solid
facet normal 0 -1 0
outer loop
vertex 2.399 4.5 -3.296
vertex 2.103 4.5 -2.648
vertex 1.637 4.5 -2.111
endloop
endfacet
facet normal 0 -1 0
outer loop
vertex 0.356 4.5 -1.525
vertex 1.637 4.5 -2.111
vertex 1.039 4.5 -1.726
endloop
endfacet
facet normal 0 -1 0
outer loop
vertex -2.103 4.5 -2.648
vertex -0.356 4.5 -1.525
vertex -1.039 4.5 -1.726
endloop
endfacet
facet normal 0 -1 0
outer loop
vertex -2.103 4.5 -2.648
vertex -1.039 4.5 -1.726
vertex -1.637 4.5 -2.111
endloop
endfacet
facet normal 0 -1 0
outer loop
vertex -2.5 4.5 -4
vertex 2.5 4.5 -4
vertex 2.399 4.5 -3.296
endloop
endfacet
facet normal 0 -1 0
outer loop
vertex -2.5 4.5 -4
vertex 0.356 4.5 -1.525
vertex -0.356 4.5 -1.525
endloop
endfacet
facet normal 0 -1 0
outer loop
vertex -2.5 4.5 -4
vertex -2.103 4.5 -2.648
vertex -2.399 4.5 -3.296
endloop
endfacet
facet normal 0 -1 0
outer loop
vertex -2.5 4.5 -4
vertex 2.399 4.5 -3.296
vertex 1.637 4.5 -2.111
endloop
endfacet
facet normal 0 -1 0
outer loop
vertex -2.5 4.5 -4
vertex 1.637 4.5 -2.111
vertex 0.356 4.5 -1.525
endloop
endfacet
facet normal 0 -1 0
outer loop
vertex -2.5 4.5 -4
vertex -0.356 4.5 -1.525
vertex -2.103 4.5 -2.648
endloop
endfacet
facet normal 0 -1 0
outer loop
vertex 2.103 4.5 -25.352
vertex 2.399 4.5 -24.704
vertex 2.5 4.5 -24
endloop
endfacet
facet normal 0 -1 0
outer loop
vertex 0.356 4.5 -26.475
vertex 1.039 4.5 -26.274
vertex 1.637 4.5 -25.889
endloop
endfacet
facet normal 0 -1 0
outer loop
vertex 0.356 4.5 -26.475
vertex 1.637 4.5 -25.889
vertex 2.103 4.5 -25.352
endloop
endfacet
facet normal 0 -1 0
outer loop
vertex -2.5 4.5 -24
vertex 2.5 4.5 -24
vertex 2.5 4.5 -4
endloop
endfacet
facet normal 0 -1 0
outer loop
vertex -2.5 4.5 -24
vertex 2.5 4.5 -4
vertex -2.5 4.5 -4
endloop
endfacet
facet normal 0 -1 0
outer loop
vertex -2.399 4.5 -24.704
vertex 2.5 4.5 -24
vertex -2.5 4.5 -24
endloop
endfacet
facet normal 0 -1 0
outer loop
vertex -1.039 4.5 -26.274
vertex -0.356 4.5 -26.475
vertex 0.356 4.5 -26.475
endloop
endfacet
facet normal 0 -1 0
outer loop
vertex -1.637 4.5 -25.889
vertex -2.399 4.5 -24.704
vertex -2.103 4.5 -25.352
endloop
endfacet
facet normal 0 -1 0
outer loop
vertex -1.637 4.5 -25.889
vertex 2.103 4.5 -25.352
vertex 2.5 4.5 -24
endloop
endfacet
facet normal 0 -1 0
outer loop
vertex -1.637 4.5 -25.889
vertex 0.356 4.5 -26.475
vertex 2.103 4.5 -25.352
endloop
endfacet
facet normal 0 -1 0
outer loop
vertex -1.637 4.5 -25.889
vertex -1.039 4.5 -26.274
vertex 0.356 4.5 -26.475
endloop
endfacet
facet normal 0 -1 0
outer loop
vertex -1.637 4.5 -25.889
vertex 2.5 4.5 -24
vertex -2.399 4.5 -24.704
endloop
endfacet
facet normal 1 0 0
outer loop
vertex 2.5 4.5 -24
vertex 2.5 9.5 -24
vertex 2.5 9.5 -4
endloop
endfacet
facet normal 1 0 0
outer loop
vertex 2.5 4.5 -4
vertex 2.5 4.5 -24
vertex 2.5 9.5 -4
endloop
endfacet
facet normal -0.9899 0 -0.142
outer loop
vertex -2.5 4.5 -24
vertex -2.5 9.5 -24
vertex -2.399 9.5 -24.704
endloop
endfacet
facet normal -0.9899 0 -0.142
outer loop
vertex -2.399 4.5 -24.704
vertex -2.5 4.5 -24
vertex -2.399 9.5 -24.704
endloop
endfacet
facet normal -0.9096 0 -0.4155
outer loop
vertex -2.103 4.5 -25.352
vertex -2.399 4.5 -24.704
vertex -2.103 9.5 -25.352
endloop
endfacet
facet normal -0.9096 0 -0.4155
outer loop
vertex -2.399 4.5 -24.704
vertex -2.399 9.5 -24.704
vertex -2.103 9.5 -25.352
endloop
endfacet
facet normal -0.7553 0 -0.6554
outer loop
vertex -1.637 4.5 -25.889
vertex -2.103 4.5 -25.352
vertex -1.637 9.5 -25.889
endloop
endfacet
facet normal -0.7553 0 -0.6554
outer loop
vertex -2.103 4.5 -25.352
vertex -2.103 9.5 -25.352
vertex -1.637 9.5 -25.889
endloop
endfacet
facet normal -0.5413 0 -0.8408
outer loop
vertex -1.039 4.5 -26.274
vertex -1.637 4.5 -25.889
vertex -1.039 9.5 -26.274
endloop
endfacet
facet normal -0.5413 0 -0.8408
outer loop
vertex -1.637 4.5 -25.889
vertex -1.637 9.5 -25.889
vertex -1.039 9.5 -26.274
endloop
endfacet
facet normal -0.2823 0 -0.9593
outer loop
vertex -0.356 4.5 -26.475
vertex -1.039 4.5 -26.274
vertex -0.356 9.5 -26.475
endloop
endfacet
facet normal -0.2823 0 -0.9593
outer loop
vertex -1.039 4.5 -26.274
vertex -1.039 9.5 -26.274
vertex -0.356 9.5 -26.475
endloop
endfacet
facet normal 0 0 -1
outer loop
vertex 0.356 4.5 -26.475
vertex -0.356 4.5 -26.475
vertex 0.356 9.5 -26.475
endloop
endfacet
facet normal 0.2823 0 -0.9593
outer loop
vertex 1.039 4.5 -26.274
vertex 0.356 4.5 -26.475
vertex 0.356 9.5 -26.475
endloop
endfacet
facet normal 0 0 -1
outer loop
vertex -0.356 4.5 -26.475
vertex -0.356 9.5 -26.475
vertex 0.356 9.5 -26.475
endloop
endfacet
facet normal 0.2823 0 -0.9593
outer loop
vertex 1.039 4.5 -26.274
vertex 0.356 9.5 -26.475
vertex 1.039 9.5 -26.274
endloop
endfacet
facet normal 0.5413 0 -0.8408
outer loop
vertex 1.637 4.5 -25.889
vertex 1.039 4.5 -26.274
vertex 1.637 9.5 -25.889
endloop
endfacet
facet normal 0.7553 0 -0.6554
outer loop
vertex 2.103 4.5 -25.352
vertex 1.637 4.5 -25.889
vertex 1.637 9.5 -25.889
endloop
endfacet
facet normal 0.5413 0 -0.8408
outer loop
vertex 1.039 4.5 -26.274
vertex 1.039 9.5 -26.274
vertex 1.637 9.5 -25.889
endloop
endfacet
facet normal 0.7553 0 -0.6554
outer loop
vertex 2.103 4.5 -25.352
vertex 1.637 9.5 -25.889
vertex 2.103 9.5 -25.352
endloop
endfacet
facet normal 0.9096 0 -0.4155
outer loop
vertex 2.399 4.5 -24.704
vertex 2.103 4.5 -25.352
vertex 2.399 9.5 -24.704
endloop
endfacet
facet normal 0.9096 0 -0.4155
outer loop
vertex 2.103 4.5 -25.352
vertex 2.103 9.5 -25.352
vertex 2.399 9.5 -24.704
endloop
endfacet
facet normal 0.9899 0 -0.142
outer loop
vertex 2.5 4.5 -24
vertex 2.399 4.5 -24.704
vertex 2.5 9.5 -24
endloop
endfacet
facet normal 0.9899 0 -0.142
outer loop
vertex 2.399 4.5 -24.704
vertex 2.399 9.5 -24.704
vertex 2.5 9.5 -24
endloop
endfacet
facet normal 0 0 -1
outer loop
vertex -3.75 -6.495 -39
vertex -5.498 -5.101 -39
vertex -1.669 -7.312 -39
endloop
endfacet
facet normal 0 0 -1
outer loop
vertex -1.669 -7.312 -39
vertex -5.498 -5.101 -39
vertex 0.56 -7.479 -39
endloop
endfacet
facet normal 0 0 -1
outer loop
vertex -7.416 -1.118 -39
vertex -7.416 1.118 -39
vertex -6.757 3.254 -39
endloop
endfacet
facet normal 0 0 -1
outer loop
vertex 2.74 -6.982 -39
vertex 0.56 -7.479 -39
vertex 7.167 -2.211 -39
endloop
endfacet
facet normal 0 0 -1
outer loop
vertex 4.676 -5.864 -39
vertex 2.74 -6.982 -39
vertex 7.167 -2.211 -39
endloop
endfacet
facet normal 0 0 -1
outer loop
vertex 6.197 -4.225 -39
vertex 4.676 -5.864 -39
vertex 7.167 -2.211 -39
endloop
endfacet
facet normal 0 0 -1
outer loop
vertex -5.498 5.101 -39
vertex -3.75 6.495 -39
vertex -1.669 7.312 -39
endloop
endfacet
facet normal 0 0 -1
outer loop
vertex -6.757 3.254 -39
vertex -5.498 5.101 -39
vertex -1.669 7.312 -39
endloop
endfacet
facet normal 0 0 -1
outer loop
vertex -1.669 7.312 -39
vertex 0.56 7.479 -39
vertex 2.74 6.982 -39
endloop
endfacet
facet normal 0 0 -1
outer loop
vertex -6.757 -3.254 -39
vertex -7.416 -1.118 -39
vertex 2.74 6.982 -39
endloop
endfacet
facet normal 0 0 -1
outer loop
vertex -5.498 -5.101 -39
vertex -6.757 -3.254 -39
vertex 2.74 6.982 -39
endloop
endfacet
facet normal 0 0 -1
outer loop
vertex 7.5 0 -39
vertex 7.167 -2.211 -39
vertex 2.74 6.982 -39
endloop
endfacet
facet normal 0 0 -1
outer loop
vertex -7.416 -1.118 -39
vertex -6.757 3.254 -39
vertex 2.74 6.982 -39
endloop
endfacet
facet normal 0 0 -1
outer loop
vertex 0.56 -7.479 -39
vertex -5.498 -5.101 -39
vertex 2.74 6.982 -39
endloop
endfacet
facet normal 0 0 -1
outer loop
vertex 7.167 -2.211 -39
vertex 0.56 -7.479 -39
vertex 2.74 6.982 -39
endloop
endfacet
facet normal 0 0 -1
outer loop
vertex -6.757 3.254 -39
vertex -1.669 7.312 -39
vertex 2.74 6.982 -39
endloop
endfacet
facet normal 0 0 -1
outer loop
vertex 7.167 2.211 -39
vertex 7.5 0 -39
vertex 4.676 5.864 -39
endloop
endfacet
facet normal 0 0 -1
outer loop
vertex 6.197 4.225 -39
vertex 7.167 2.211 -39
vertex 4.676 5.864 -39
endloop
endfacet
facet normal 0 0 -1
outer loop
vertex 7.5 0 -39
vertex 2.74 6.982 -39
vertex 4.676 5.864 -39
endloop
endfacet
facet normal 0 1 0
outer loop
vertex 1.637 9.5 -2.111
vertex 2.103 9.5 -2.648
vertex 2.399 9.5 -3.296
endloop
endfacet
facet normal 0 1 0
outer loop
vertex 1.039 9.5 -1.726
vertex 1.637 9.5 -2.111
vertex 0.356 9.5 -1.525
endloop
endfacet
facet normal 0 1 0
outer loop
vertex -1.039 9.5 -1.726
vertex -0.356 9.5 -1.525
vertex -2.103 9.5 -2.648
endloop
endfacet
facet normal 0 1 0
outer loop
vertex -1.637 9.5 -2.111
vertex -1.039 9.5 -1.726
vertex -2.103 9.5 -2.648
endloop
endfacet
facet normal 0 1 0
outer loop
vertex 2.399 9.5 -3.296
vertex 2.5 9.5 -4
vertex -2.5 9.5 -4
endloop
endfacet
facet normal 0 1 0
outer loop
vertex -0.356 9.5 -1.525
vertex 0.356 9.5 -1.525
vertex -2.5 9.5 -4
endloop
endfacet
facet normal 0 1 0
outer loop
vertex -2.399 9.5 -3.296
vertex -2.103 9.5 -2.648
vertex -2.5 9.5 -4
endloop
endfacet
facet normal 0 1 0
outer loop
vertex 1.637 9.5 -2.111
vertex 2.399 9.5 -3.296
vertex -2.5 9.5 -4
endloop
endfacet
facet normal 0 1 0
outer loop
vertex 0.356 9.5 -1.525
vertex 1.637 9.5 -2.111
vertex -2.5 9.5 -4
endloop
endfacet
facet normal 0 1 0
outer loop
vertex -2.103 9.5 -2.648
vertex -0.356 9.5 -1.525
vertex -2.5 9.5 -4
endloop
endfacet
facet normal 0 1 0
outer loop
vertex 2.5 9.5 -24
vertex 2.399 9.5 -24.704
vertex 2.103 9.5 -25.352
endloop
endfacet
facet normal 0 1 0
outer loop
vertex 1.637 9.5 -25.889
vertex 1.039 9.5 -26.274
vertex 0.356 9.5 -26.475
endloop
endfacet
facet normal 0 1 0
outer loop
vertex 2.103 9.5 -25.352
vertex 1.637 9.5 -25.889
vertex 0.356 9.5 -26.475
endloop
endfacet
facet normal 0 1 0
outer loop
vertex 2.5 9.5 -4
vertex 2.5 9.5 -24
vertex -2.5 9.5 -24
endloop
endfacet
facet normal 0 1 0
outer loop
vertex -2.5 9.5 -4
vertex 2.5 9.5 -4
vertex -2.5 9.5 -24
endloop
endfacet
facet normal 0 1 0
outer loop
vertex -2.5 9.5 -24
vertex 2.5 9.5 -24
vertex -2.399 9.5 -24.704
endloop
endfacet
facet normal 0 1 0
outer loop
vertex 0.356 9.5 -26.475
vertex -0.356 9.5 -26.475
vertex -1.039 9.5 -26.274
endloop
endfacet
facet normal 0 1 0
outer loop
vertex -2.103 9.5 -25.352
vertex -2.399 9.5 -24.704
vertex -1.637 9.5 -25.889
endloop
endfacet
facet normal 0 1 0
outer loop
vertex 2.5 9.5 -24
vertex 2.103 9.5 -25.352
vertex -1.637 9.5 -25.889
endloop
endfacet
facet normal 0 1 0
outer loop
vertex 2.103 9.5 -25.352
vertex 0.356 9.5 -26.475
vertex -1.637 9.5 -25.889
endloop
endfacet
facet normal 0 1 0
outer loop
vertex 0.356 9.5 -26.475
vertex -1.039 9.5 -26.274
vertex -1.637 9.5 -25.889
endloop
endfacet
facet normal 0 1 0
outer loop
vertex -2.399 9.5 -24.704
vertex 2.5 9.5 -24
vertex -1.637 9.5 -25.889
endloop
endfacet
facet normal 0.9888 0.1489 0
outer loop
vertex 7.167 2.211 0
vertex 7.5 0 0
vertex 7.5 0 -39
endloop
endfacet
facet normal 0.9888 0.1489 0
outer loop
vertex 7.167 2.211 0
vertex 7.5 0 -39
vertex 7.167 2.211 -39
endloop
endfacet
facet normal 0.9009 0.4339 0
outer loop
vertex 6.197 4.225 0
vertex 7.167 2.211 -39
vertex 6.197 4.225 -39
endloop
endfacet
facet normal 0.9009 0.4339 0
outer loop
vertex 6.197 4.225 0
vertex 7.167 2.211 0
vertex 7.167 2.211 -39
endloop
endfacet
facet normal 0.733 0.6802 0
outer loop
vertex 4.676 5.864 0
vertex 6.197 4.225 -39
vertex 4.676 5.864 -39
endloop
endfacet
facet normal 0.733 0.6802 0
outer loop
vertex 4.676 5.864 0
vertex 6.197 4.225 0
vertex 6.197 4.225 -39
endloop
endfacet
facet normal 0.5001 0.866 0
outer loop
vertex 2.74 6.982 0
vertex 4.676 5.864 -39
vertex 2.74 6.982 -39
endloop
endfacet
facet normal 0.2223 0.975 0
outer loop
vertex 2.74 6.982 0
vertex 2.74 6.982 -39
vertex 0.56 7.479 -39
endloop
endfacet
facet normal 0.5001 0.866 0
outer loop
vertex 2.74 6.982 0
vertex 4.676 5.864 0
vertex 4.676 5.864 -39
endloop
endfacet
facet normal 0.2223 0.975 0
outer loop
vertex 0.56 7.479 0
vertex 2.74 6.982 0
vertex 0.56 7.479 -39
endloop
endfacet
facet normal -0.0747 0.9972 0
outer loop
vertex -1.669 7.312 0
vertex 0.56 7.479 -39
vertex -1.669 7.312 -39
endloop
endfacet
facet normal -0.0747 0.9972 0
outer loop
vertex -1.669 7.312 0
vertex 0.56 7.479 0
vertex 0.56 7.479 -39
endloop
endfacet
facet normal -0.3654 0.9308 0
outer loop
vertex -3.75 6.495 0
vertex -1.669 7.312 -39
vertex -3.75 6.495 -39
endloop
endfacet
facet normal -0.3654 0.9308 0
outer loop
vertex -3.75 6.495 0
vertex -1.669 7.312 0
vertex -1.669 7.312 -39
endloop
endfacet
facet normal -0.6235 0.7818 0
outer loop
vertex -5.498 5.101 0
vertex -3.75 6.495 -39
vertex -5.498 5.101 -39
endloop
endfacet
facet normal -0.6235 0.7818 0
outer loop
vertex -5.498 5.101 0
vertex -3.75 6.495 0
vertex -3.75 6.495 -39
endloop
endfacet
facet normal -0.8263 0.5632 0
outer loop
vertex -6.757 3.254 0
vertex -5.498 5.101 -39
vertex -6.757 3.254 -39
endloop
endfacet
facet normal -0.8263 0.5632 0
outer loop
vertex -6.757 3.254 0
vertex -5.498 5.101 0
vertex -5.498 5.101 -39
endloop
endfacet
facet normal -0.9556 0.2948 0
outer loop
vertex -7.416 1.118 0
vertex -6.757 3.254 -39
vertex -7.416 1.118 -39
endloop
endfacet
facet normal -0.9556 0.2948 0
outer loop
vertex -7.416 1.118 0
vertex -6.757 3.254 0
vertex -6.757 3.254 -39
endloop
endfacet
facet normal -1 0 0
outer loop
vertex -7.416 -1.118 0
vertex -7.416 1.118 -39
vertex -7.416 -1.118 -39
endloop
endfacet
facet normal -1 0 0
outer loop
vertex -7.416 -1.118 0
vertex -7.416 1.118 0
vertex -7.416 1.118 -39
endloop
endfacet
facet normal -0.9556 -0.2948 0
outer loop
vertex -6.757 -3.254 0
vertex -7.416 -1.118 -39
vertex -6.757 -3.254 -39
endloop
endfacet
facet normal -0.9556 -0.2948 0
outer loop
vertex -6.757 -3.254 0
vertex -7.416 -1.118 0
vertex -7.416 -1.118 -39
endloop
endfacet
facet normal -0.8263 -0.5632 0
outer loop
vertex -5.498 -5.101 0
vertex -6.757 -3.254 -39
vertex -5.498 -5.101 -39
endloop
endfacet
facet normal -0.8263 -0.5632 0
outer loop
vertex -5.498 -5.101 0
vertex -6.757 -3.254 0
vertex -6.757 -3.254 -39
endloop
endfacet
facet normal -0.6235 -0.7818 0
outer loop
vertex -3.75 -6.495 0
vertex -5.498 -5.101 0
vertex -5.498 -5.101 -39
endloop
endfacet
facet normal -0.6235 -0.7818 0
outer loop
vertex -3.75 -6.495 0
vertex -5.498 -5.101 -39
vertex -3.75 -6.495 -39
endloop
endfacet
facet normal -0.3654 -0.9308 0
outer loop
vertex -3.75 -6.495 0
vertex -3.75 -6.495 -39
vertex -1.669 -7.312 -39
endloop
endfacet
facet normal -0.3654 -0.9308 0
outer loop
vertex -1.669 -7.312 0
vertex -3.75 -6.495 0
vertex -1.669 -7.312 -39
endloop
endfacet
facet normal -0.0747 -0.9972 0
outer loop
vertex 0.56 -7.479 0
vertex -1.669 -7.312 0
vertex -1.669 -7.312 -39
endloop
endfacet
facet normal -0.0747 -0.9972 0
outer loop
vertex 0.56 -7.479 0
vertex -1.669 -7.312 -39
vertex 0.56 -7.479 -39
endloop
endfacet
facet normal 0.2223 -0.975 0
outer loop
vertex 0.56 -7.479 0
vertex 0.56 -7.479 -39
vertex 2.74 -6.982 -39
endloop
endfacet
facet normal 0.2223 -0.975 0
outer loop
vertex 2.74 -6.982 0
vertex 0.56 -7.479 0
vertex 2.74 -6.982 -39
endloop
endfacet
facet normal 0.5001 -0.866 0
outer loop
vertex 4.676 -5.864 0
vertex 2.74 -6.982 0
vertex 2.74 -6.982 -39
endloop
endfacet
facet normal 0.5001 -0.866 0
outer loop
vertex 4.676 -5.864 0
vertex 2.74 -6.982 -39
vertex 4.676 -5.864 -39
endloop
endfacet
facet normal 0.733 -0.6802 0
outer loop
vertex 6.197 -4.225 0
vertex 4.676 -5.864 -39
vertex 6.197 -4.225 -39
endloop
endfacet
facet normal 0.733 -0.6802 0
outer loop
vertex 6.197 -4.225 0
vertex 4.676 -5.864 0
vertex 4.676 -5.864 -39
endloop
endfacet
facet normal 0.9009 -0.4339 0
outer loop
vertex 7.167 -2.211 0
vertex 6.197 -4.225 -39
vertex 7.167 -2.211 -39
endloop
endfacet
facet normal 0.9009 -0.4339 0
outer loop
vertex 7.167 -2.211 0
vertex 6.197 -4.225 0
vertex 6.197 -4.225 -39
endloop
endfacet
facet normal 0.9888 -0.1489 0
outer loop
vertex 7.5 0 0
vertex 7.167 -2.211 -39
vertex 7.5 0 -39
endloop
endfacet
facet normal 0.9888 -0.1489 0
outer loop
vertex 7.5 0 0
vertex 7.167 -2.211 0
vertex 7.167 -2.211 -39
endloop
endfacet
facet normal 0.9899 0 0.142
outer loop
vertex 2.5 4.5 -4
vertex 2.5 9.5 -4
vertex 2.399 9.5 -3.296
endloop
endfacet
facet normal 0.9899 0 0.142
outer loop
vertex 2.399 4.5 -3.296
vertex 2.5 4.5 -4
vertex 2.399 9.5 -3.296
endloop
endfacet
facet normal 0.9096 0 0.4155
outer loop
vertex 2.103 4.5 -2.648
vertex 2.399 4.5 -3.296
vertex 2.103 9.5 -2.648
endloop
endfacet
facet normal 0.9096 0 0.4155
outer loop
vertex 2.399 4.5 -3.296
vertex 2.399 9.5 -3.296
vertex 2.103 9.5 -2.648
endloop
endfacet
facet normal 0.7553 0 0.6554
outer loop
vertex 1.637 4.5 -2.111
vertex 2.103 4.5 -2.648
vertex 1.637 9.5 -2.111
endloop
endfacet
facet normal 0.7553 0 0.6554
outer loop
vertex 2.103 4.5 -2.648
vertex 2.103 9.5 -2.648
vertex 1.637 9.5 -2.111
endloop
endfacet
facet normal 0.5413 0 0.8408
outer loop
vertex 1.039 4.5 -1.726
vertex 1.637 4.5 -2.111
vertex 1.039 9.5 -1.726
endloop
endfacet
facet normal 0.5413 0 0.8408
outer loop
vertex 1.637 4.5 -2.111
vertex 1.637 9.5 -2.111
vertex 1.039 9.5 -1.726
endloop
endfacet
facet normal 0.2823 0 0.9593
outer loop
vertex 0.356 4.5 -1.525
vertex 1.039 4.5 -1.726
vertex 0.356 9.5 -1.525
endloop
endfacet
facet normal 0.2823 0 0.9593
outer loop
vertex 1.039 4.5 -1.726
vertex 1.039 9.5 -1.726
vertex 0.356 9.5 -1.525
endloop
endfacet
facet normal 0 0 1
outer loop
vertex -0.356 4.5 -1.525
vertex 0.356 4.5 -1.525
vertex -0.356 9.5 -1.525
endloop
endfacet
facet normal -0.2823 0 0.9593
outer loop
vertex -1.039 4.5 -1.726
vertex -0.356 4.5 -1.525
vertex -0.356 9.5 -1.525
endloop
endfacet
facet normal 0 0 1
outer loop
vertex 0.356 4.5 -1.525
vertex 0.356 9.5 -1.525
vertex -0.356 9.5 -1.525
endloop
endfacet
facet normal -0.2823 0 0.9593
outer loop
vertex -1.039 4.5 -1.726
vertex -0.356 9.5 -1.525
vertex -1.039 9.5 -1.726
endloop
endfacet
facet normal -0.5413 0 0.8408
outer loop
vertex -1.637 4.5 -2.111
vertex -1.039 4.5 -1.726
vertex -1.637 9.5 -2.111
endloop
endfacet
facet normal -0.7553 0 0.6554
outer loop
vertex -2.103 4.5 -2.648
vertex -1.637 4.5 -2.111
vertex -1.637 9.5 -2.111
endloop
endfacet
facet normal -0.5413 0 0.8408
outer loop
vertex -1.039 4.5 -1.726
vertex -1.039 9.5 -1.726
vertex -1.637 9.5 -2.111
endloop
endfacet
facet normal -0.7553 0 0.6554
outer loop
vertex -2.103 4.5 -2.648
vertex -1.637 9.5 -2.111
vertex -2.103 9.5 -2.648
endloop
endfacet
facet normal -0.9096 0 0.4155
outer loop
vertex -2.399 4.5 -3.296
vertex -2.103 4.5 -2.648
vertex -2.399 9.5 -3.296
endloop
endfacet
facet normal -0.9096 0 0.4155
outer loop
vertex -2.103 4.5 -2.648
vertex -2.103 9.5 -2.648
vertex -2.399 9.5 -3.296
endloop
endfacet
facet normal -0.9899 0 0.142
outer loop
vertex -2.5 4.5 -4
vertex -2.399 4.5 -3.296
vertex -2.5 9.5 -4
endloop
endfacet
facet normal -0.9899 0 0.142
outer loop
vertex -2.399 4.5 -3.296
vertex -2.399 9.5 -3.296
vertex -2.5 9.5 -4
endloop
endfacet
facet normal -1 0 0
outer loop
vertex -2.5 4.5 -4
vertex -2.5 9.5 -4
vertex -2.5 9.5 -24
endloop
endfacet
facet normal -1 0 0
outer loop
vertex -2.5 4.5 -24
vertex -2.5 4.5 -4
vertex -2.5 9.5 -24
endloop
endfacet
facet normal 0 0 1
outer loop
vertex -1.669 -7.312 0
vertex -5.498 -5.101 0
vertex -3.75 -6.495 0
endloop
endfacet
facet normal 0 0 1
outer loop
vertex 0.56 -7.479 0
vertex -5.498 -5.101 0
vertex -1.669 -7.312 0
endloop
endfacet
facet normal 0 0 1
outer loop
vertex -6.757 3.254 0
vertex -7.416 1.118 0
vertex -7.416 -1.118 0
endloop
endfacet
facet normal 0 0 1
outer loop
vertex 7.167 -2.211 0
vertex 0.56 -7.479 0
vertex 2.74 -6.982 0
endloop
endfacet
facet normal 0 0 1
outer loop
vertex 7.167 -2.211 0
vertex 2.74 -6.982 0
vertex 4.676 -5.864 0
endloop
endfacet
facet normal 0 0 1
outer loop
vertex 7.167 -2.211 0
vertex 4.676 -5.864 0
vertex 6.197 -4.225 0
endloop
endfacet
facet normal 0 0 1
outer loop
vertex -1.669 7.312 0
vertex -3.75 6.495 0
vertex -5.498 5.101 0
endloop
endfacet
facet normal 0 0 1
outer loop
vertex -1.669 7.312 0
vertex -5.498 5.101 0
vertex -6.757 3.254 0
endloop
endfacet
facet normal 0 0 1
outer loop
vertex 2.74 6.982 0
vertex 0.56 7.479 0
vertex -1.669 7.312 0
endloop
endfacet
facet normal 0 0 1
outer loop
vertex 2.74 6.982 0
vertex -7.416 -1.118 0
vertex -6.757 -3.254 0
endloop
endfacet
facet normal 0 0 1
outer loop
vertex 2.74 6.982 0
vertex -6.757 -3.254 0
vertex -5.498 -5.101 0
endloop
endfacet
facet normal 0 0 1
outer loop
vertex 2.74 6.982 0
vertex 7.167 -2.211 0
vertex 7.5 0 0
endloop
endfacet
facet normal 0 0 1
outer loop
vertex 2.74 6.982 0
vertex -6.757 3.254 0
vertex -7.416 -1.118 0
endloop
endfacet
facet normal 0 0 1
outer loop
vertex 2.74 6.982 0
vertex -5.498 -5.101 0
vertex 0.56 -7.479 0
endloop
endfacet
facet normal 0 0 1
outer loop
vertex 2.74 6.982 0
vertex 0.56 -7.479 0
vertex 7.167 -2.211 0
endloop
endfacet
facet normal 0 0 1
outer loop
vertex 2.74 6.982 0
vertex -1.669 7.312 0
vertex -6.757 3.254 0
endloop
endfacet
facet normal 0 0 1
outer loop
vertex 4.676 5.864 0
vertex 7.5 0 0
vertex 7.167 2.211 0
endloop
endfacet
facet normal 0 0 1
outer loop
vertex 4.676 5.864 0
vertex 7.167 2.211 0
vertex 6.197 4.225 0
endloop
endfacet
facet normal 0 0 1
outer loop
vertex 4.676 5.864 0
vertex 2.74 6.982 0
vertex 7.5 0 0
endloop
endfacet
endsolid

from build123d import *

# Parameters (mm, degrees)
SKETCH1_R           = 7.5
BOSS_EXTRUDE1_DEPTH = 39
BOSS_EXTRUDE2_DEPTH = 5


with BuildPart() as part:
    # Sketch1 → Boss-Extrude1 (new body)
    with BuildSketch(Plane.XY):
        Circle(SKETCH1_R)
    extrude(amount=-BOSS_EXTRUDE1_DEPTH)


with BuildPart() as body_2:
    # Sketch2 → Boss-Extrude2 (new body)
    with BuildSketch(Plane(origin=(0, 9.5, 0), x_dir=(1, 0, 0), z_dir=(0, 1, 0))):
        with BuildLine():
            Line((2.5, 24), (2.5, 4))
            ThreePointArc((2.5, 4), (0, 1.5), (-2.5, 4))
            Line((-2.5, 4), (-2.5, 24))
            ThreePointArc((-2.5, 24), (0, 26.5), (2.5, 24))
        make_face()
    extrude(amount=-BOSS_EXTRUDE2_DEPTH)


solid = Compound([part.part, body_2.part])
